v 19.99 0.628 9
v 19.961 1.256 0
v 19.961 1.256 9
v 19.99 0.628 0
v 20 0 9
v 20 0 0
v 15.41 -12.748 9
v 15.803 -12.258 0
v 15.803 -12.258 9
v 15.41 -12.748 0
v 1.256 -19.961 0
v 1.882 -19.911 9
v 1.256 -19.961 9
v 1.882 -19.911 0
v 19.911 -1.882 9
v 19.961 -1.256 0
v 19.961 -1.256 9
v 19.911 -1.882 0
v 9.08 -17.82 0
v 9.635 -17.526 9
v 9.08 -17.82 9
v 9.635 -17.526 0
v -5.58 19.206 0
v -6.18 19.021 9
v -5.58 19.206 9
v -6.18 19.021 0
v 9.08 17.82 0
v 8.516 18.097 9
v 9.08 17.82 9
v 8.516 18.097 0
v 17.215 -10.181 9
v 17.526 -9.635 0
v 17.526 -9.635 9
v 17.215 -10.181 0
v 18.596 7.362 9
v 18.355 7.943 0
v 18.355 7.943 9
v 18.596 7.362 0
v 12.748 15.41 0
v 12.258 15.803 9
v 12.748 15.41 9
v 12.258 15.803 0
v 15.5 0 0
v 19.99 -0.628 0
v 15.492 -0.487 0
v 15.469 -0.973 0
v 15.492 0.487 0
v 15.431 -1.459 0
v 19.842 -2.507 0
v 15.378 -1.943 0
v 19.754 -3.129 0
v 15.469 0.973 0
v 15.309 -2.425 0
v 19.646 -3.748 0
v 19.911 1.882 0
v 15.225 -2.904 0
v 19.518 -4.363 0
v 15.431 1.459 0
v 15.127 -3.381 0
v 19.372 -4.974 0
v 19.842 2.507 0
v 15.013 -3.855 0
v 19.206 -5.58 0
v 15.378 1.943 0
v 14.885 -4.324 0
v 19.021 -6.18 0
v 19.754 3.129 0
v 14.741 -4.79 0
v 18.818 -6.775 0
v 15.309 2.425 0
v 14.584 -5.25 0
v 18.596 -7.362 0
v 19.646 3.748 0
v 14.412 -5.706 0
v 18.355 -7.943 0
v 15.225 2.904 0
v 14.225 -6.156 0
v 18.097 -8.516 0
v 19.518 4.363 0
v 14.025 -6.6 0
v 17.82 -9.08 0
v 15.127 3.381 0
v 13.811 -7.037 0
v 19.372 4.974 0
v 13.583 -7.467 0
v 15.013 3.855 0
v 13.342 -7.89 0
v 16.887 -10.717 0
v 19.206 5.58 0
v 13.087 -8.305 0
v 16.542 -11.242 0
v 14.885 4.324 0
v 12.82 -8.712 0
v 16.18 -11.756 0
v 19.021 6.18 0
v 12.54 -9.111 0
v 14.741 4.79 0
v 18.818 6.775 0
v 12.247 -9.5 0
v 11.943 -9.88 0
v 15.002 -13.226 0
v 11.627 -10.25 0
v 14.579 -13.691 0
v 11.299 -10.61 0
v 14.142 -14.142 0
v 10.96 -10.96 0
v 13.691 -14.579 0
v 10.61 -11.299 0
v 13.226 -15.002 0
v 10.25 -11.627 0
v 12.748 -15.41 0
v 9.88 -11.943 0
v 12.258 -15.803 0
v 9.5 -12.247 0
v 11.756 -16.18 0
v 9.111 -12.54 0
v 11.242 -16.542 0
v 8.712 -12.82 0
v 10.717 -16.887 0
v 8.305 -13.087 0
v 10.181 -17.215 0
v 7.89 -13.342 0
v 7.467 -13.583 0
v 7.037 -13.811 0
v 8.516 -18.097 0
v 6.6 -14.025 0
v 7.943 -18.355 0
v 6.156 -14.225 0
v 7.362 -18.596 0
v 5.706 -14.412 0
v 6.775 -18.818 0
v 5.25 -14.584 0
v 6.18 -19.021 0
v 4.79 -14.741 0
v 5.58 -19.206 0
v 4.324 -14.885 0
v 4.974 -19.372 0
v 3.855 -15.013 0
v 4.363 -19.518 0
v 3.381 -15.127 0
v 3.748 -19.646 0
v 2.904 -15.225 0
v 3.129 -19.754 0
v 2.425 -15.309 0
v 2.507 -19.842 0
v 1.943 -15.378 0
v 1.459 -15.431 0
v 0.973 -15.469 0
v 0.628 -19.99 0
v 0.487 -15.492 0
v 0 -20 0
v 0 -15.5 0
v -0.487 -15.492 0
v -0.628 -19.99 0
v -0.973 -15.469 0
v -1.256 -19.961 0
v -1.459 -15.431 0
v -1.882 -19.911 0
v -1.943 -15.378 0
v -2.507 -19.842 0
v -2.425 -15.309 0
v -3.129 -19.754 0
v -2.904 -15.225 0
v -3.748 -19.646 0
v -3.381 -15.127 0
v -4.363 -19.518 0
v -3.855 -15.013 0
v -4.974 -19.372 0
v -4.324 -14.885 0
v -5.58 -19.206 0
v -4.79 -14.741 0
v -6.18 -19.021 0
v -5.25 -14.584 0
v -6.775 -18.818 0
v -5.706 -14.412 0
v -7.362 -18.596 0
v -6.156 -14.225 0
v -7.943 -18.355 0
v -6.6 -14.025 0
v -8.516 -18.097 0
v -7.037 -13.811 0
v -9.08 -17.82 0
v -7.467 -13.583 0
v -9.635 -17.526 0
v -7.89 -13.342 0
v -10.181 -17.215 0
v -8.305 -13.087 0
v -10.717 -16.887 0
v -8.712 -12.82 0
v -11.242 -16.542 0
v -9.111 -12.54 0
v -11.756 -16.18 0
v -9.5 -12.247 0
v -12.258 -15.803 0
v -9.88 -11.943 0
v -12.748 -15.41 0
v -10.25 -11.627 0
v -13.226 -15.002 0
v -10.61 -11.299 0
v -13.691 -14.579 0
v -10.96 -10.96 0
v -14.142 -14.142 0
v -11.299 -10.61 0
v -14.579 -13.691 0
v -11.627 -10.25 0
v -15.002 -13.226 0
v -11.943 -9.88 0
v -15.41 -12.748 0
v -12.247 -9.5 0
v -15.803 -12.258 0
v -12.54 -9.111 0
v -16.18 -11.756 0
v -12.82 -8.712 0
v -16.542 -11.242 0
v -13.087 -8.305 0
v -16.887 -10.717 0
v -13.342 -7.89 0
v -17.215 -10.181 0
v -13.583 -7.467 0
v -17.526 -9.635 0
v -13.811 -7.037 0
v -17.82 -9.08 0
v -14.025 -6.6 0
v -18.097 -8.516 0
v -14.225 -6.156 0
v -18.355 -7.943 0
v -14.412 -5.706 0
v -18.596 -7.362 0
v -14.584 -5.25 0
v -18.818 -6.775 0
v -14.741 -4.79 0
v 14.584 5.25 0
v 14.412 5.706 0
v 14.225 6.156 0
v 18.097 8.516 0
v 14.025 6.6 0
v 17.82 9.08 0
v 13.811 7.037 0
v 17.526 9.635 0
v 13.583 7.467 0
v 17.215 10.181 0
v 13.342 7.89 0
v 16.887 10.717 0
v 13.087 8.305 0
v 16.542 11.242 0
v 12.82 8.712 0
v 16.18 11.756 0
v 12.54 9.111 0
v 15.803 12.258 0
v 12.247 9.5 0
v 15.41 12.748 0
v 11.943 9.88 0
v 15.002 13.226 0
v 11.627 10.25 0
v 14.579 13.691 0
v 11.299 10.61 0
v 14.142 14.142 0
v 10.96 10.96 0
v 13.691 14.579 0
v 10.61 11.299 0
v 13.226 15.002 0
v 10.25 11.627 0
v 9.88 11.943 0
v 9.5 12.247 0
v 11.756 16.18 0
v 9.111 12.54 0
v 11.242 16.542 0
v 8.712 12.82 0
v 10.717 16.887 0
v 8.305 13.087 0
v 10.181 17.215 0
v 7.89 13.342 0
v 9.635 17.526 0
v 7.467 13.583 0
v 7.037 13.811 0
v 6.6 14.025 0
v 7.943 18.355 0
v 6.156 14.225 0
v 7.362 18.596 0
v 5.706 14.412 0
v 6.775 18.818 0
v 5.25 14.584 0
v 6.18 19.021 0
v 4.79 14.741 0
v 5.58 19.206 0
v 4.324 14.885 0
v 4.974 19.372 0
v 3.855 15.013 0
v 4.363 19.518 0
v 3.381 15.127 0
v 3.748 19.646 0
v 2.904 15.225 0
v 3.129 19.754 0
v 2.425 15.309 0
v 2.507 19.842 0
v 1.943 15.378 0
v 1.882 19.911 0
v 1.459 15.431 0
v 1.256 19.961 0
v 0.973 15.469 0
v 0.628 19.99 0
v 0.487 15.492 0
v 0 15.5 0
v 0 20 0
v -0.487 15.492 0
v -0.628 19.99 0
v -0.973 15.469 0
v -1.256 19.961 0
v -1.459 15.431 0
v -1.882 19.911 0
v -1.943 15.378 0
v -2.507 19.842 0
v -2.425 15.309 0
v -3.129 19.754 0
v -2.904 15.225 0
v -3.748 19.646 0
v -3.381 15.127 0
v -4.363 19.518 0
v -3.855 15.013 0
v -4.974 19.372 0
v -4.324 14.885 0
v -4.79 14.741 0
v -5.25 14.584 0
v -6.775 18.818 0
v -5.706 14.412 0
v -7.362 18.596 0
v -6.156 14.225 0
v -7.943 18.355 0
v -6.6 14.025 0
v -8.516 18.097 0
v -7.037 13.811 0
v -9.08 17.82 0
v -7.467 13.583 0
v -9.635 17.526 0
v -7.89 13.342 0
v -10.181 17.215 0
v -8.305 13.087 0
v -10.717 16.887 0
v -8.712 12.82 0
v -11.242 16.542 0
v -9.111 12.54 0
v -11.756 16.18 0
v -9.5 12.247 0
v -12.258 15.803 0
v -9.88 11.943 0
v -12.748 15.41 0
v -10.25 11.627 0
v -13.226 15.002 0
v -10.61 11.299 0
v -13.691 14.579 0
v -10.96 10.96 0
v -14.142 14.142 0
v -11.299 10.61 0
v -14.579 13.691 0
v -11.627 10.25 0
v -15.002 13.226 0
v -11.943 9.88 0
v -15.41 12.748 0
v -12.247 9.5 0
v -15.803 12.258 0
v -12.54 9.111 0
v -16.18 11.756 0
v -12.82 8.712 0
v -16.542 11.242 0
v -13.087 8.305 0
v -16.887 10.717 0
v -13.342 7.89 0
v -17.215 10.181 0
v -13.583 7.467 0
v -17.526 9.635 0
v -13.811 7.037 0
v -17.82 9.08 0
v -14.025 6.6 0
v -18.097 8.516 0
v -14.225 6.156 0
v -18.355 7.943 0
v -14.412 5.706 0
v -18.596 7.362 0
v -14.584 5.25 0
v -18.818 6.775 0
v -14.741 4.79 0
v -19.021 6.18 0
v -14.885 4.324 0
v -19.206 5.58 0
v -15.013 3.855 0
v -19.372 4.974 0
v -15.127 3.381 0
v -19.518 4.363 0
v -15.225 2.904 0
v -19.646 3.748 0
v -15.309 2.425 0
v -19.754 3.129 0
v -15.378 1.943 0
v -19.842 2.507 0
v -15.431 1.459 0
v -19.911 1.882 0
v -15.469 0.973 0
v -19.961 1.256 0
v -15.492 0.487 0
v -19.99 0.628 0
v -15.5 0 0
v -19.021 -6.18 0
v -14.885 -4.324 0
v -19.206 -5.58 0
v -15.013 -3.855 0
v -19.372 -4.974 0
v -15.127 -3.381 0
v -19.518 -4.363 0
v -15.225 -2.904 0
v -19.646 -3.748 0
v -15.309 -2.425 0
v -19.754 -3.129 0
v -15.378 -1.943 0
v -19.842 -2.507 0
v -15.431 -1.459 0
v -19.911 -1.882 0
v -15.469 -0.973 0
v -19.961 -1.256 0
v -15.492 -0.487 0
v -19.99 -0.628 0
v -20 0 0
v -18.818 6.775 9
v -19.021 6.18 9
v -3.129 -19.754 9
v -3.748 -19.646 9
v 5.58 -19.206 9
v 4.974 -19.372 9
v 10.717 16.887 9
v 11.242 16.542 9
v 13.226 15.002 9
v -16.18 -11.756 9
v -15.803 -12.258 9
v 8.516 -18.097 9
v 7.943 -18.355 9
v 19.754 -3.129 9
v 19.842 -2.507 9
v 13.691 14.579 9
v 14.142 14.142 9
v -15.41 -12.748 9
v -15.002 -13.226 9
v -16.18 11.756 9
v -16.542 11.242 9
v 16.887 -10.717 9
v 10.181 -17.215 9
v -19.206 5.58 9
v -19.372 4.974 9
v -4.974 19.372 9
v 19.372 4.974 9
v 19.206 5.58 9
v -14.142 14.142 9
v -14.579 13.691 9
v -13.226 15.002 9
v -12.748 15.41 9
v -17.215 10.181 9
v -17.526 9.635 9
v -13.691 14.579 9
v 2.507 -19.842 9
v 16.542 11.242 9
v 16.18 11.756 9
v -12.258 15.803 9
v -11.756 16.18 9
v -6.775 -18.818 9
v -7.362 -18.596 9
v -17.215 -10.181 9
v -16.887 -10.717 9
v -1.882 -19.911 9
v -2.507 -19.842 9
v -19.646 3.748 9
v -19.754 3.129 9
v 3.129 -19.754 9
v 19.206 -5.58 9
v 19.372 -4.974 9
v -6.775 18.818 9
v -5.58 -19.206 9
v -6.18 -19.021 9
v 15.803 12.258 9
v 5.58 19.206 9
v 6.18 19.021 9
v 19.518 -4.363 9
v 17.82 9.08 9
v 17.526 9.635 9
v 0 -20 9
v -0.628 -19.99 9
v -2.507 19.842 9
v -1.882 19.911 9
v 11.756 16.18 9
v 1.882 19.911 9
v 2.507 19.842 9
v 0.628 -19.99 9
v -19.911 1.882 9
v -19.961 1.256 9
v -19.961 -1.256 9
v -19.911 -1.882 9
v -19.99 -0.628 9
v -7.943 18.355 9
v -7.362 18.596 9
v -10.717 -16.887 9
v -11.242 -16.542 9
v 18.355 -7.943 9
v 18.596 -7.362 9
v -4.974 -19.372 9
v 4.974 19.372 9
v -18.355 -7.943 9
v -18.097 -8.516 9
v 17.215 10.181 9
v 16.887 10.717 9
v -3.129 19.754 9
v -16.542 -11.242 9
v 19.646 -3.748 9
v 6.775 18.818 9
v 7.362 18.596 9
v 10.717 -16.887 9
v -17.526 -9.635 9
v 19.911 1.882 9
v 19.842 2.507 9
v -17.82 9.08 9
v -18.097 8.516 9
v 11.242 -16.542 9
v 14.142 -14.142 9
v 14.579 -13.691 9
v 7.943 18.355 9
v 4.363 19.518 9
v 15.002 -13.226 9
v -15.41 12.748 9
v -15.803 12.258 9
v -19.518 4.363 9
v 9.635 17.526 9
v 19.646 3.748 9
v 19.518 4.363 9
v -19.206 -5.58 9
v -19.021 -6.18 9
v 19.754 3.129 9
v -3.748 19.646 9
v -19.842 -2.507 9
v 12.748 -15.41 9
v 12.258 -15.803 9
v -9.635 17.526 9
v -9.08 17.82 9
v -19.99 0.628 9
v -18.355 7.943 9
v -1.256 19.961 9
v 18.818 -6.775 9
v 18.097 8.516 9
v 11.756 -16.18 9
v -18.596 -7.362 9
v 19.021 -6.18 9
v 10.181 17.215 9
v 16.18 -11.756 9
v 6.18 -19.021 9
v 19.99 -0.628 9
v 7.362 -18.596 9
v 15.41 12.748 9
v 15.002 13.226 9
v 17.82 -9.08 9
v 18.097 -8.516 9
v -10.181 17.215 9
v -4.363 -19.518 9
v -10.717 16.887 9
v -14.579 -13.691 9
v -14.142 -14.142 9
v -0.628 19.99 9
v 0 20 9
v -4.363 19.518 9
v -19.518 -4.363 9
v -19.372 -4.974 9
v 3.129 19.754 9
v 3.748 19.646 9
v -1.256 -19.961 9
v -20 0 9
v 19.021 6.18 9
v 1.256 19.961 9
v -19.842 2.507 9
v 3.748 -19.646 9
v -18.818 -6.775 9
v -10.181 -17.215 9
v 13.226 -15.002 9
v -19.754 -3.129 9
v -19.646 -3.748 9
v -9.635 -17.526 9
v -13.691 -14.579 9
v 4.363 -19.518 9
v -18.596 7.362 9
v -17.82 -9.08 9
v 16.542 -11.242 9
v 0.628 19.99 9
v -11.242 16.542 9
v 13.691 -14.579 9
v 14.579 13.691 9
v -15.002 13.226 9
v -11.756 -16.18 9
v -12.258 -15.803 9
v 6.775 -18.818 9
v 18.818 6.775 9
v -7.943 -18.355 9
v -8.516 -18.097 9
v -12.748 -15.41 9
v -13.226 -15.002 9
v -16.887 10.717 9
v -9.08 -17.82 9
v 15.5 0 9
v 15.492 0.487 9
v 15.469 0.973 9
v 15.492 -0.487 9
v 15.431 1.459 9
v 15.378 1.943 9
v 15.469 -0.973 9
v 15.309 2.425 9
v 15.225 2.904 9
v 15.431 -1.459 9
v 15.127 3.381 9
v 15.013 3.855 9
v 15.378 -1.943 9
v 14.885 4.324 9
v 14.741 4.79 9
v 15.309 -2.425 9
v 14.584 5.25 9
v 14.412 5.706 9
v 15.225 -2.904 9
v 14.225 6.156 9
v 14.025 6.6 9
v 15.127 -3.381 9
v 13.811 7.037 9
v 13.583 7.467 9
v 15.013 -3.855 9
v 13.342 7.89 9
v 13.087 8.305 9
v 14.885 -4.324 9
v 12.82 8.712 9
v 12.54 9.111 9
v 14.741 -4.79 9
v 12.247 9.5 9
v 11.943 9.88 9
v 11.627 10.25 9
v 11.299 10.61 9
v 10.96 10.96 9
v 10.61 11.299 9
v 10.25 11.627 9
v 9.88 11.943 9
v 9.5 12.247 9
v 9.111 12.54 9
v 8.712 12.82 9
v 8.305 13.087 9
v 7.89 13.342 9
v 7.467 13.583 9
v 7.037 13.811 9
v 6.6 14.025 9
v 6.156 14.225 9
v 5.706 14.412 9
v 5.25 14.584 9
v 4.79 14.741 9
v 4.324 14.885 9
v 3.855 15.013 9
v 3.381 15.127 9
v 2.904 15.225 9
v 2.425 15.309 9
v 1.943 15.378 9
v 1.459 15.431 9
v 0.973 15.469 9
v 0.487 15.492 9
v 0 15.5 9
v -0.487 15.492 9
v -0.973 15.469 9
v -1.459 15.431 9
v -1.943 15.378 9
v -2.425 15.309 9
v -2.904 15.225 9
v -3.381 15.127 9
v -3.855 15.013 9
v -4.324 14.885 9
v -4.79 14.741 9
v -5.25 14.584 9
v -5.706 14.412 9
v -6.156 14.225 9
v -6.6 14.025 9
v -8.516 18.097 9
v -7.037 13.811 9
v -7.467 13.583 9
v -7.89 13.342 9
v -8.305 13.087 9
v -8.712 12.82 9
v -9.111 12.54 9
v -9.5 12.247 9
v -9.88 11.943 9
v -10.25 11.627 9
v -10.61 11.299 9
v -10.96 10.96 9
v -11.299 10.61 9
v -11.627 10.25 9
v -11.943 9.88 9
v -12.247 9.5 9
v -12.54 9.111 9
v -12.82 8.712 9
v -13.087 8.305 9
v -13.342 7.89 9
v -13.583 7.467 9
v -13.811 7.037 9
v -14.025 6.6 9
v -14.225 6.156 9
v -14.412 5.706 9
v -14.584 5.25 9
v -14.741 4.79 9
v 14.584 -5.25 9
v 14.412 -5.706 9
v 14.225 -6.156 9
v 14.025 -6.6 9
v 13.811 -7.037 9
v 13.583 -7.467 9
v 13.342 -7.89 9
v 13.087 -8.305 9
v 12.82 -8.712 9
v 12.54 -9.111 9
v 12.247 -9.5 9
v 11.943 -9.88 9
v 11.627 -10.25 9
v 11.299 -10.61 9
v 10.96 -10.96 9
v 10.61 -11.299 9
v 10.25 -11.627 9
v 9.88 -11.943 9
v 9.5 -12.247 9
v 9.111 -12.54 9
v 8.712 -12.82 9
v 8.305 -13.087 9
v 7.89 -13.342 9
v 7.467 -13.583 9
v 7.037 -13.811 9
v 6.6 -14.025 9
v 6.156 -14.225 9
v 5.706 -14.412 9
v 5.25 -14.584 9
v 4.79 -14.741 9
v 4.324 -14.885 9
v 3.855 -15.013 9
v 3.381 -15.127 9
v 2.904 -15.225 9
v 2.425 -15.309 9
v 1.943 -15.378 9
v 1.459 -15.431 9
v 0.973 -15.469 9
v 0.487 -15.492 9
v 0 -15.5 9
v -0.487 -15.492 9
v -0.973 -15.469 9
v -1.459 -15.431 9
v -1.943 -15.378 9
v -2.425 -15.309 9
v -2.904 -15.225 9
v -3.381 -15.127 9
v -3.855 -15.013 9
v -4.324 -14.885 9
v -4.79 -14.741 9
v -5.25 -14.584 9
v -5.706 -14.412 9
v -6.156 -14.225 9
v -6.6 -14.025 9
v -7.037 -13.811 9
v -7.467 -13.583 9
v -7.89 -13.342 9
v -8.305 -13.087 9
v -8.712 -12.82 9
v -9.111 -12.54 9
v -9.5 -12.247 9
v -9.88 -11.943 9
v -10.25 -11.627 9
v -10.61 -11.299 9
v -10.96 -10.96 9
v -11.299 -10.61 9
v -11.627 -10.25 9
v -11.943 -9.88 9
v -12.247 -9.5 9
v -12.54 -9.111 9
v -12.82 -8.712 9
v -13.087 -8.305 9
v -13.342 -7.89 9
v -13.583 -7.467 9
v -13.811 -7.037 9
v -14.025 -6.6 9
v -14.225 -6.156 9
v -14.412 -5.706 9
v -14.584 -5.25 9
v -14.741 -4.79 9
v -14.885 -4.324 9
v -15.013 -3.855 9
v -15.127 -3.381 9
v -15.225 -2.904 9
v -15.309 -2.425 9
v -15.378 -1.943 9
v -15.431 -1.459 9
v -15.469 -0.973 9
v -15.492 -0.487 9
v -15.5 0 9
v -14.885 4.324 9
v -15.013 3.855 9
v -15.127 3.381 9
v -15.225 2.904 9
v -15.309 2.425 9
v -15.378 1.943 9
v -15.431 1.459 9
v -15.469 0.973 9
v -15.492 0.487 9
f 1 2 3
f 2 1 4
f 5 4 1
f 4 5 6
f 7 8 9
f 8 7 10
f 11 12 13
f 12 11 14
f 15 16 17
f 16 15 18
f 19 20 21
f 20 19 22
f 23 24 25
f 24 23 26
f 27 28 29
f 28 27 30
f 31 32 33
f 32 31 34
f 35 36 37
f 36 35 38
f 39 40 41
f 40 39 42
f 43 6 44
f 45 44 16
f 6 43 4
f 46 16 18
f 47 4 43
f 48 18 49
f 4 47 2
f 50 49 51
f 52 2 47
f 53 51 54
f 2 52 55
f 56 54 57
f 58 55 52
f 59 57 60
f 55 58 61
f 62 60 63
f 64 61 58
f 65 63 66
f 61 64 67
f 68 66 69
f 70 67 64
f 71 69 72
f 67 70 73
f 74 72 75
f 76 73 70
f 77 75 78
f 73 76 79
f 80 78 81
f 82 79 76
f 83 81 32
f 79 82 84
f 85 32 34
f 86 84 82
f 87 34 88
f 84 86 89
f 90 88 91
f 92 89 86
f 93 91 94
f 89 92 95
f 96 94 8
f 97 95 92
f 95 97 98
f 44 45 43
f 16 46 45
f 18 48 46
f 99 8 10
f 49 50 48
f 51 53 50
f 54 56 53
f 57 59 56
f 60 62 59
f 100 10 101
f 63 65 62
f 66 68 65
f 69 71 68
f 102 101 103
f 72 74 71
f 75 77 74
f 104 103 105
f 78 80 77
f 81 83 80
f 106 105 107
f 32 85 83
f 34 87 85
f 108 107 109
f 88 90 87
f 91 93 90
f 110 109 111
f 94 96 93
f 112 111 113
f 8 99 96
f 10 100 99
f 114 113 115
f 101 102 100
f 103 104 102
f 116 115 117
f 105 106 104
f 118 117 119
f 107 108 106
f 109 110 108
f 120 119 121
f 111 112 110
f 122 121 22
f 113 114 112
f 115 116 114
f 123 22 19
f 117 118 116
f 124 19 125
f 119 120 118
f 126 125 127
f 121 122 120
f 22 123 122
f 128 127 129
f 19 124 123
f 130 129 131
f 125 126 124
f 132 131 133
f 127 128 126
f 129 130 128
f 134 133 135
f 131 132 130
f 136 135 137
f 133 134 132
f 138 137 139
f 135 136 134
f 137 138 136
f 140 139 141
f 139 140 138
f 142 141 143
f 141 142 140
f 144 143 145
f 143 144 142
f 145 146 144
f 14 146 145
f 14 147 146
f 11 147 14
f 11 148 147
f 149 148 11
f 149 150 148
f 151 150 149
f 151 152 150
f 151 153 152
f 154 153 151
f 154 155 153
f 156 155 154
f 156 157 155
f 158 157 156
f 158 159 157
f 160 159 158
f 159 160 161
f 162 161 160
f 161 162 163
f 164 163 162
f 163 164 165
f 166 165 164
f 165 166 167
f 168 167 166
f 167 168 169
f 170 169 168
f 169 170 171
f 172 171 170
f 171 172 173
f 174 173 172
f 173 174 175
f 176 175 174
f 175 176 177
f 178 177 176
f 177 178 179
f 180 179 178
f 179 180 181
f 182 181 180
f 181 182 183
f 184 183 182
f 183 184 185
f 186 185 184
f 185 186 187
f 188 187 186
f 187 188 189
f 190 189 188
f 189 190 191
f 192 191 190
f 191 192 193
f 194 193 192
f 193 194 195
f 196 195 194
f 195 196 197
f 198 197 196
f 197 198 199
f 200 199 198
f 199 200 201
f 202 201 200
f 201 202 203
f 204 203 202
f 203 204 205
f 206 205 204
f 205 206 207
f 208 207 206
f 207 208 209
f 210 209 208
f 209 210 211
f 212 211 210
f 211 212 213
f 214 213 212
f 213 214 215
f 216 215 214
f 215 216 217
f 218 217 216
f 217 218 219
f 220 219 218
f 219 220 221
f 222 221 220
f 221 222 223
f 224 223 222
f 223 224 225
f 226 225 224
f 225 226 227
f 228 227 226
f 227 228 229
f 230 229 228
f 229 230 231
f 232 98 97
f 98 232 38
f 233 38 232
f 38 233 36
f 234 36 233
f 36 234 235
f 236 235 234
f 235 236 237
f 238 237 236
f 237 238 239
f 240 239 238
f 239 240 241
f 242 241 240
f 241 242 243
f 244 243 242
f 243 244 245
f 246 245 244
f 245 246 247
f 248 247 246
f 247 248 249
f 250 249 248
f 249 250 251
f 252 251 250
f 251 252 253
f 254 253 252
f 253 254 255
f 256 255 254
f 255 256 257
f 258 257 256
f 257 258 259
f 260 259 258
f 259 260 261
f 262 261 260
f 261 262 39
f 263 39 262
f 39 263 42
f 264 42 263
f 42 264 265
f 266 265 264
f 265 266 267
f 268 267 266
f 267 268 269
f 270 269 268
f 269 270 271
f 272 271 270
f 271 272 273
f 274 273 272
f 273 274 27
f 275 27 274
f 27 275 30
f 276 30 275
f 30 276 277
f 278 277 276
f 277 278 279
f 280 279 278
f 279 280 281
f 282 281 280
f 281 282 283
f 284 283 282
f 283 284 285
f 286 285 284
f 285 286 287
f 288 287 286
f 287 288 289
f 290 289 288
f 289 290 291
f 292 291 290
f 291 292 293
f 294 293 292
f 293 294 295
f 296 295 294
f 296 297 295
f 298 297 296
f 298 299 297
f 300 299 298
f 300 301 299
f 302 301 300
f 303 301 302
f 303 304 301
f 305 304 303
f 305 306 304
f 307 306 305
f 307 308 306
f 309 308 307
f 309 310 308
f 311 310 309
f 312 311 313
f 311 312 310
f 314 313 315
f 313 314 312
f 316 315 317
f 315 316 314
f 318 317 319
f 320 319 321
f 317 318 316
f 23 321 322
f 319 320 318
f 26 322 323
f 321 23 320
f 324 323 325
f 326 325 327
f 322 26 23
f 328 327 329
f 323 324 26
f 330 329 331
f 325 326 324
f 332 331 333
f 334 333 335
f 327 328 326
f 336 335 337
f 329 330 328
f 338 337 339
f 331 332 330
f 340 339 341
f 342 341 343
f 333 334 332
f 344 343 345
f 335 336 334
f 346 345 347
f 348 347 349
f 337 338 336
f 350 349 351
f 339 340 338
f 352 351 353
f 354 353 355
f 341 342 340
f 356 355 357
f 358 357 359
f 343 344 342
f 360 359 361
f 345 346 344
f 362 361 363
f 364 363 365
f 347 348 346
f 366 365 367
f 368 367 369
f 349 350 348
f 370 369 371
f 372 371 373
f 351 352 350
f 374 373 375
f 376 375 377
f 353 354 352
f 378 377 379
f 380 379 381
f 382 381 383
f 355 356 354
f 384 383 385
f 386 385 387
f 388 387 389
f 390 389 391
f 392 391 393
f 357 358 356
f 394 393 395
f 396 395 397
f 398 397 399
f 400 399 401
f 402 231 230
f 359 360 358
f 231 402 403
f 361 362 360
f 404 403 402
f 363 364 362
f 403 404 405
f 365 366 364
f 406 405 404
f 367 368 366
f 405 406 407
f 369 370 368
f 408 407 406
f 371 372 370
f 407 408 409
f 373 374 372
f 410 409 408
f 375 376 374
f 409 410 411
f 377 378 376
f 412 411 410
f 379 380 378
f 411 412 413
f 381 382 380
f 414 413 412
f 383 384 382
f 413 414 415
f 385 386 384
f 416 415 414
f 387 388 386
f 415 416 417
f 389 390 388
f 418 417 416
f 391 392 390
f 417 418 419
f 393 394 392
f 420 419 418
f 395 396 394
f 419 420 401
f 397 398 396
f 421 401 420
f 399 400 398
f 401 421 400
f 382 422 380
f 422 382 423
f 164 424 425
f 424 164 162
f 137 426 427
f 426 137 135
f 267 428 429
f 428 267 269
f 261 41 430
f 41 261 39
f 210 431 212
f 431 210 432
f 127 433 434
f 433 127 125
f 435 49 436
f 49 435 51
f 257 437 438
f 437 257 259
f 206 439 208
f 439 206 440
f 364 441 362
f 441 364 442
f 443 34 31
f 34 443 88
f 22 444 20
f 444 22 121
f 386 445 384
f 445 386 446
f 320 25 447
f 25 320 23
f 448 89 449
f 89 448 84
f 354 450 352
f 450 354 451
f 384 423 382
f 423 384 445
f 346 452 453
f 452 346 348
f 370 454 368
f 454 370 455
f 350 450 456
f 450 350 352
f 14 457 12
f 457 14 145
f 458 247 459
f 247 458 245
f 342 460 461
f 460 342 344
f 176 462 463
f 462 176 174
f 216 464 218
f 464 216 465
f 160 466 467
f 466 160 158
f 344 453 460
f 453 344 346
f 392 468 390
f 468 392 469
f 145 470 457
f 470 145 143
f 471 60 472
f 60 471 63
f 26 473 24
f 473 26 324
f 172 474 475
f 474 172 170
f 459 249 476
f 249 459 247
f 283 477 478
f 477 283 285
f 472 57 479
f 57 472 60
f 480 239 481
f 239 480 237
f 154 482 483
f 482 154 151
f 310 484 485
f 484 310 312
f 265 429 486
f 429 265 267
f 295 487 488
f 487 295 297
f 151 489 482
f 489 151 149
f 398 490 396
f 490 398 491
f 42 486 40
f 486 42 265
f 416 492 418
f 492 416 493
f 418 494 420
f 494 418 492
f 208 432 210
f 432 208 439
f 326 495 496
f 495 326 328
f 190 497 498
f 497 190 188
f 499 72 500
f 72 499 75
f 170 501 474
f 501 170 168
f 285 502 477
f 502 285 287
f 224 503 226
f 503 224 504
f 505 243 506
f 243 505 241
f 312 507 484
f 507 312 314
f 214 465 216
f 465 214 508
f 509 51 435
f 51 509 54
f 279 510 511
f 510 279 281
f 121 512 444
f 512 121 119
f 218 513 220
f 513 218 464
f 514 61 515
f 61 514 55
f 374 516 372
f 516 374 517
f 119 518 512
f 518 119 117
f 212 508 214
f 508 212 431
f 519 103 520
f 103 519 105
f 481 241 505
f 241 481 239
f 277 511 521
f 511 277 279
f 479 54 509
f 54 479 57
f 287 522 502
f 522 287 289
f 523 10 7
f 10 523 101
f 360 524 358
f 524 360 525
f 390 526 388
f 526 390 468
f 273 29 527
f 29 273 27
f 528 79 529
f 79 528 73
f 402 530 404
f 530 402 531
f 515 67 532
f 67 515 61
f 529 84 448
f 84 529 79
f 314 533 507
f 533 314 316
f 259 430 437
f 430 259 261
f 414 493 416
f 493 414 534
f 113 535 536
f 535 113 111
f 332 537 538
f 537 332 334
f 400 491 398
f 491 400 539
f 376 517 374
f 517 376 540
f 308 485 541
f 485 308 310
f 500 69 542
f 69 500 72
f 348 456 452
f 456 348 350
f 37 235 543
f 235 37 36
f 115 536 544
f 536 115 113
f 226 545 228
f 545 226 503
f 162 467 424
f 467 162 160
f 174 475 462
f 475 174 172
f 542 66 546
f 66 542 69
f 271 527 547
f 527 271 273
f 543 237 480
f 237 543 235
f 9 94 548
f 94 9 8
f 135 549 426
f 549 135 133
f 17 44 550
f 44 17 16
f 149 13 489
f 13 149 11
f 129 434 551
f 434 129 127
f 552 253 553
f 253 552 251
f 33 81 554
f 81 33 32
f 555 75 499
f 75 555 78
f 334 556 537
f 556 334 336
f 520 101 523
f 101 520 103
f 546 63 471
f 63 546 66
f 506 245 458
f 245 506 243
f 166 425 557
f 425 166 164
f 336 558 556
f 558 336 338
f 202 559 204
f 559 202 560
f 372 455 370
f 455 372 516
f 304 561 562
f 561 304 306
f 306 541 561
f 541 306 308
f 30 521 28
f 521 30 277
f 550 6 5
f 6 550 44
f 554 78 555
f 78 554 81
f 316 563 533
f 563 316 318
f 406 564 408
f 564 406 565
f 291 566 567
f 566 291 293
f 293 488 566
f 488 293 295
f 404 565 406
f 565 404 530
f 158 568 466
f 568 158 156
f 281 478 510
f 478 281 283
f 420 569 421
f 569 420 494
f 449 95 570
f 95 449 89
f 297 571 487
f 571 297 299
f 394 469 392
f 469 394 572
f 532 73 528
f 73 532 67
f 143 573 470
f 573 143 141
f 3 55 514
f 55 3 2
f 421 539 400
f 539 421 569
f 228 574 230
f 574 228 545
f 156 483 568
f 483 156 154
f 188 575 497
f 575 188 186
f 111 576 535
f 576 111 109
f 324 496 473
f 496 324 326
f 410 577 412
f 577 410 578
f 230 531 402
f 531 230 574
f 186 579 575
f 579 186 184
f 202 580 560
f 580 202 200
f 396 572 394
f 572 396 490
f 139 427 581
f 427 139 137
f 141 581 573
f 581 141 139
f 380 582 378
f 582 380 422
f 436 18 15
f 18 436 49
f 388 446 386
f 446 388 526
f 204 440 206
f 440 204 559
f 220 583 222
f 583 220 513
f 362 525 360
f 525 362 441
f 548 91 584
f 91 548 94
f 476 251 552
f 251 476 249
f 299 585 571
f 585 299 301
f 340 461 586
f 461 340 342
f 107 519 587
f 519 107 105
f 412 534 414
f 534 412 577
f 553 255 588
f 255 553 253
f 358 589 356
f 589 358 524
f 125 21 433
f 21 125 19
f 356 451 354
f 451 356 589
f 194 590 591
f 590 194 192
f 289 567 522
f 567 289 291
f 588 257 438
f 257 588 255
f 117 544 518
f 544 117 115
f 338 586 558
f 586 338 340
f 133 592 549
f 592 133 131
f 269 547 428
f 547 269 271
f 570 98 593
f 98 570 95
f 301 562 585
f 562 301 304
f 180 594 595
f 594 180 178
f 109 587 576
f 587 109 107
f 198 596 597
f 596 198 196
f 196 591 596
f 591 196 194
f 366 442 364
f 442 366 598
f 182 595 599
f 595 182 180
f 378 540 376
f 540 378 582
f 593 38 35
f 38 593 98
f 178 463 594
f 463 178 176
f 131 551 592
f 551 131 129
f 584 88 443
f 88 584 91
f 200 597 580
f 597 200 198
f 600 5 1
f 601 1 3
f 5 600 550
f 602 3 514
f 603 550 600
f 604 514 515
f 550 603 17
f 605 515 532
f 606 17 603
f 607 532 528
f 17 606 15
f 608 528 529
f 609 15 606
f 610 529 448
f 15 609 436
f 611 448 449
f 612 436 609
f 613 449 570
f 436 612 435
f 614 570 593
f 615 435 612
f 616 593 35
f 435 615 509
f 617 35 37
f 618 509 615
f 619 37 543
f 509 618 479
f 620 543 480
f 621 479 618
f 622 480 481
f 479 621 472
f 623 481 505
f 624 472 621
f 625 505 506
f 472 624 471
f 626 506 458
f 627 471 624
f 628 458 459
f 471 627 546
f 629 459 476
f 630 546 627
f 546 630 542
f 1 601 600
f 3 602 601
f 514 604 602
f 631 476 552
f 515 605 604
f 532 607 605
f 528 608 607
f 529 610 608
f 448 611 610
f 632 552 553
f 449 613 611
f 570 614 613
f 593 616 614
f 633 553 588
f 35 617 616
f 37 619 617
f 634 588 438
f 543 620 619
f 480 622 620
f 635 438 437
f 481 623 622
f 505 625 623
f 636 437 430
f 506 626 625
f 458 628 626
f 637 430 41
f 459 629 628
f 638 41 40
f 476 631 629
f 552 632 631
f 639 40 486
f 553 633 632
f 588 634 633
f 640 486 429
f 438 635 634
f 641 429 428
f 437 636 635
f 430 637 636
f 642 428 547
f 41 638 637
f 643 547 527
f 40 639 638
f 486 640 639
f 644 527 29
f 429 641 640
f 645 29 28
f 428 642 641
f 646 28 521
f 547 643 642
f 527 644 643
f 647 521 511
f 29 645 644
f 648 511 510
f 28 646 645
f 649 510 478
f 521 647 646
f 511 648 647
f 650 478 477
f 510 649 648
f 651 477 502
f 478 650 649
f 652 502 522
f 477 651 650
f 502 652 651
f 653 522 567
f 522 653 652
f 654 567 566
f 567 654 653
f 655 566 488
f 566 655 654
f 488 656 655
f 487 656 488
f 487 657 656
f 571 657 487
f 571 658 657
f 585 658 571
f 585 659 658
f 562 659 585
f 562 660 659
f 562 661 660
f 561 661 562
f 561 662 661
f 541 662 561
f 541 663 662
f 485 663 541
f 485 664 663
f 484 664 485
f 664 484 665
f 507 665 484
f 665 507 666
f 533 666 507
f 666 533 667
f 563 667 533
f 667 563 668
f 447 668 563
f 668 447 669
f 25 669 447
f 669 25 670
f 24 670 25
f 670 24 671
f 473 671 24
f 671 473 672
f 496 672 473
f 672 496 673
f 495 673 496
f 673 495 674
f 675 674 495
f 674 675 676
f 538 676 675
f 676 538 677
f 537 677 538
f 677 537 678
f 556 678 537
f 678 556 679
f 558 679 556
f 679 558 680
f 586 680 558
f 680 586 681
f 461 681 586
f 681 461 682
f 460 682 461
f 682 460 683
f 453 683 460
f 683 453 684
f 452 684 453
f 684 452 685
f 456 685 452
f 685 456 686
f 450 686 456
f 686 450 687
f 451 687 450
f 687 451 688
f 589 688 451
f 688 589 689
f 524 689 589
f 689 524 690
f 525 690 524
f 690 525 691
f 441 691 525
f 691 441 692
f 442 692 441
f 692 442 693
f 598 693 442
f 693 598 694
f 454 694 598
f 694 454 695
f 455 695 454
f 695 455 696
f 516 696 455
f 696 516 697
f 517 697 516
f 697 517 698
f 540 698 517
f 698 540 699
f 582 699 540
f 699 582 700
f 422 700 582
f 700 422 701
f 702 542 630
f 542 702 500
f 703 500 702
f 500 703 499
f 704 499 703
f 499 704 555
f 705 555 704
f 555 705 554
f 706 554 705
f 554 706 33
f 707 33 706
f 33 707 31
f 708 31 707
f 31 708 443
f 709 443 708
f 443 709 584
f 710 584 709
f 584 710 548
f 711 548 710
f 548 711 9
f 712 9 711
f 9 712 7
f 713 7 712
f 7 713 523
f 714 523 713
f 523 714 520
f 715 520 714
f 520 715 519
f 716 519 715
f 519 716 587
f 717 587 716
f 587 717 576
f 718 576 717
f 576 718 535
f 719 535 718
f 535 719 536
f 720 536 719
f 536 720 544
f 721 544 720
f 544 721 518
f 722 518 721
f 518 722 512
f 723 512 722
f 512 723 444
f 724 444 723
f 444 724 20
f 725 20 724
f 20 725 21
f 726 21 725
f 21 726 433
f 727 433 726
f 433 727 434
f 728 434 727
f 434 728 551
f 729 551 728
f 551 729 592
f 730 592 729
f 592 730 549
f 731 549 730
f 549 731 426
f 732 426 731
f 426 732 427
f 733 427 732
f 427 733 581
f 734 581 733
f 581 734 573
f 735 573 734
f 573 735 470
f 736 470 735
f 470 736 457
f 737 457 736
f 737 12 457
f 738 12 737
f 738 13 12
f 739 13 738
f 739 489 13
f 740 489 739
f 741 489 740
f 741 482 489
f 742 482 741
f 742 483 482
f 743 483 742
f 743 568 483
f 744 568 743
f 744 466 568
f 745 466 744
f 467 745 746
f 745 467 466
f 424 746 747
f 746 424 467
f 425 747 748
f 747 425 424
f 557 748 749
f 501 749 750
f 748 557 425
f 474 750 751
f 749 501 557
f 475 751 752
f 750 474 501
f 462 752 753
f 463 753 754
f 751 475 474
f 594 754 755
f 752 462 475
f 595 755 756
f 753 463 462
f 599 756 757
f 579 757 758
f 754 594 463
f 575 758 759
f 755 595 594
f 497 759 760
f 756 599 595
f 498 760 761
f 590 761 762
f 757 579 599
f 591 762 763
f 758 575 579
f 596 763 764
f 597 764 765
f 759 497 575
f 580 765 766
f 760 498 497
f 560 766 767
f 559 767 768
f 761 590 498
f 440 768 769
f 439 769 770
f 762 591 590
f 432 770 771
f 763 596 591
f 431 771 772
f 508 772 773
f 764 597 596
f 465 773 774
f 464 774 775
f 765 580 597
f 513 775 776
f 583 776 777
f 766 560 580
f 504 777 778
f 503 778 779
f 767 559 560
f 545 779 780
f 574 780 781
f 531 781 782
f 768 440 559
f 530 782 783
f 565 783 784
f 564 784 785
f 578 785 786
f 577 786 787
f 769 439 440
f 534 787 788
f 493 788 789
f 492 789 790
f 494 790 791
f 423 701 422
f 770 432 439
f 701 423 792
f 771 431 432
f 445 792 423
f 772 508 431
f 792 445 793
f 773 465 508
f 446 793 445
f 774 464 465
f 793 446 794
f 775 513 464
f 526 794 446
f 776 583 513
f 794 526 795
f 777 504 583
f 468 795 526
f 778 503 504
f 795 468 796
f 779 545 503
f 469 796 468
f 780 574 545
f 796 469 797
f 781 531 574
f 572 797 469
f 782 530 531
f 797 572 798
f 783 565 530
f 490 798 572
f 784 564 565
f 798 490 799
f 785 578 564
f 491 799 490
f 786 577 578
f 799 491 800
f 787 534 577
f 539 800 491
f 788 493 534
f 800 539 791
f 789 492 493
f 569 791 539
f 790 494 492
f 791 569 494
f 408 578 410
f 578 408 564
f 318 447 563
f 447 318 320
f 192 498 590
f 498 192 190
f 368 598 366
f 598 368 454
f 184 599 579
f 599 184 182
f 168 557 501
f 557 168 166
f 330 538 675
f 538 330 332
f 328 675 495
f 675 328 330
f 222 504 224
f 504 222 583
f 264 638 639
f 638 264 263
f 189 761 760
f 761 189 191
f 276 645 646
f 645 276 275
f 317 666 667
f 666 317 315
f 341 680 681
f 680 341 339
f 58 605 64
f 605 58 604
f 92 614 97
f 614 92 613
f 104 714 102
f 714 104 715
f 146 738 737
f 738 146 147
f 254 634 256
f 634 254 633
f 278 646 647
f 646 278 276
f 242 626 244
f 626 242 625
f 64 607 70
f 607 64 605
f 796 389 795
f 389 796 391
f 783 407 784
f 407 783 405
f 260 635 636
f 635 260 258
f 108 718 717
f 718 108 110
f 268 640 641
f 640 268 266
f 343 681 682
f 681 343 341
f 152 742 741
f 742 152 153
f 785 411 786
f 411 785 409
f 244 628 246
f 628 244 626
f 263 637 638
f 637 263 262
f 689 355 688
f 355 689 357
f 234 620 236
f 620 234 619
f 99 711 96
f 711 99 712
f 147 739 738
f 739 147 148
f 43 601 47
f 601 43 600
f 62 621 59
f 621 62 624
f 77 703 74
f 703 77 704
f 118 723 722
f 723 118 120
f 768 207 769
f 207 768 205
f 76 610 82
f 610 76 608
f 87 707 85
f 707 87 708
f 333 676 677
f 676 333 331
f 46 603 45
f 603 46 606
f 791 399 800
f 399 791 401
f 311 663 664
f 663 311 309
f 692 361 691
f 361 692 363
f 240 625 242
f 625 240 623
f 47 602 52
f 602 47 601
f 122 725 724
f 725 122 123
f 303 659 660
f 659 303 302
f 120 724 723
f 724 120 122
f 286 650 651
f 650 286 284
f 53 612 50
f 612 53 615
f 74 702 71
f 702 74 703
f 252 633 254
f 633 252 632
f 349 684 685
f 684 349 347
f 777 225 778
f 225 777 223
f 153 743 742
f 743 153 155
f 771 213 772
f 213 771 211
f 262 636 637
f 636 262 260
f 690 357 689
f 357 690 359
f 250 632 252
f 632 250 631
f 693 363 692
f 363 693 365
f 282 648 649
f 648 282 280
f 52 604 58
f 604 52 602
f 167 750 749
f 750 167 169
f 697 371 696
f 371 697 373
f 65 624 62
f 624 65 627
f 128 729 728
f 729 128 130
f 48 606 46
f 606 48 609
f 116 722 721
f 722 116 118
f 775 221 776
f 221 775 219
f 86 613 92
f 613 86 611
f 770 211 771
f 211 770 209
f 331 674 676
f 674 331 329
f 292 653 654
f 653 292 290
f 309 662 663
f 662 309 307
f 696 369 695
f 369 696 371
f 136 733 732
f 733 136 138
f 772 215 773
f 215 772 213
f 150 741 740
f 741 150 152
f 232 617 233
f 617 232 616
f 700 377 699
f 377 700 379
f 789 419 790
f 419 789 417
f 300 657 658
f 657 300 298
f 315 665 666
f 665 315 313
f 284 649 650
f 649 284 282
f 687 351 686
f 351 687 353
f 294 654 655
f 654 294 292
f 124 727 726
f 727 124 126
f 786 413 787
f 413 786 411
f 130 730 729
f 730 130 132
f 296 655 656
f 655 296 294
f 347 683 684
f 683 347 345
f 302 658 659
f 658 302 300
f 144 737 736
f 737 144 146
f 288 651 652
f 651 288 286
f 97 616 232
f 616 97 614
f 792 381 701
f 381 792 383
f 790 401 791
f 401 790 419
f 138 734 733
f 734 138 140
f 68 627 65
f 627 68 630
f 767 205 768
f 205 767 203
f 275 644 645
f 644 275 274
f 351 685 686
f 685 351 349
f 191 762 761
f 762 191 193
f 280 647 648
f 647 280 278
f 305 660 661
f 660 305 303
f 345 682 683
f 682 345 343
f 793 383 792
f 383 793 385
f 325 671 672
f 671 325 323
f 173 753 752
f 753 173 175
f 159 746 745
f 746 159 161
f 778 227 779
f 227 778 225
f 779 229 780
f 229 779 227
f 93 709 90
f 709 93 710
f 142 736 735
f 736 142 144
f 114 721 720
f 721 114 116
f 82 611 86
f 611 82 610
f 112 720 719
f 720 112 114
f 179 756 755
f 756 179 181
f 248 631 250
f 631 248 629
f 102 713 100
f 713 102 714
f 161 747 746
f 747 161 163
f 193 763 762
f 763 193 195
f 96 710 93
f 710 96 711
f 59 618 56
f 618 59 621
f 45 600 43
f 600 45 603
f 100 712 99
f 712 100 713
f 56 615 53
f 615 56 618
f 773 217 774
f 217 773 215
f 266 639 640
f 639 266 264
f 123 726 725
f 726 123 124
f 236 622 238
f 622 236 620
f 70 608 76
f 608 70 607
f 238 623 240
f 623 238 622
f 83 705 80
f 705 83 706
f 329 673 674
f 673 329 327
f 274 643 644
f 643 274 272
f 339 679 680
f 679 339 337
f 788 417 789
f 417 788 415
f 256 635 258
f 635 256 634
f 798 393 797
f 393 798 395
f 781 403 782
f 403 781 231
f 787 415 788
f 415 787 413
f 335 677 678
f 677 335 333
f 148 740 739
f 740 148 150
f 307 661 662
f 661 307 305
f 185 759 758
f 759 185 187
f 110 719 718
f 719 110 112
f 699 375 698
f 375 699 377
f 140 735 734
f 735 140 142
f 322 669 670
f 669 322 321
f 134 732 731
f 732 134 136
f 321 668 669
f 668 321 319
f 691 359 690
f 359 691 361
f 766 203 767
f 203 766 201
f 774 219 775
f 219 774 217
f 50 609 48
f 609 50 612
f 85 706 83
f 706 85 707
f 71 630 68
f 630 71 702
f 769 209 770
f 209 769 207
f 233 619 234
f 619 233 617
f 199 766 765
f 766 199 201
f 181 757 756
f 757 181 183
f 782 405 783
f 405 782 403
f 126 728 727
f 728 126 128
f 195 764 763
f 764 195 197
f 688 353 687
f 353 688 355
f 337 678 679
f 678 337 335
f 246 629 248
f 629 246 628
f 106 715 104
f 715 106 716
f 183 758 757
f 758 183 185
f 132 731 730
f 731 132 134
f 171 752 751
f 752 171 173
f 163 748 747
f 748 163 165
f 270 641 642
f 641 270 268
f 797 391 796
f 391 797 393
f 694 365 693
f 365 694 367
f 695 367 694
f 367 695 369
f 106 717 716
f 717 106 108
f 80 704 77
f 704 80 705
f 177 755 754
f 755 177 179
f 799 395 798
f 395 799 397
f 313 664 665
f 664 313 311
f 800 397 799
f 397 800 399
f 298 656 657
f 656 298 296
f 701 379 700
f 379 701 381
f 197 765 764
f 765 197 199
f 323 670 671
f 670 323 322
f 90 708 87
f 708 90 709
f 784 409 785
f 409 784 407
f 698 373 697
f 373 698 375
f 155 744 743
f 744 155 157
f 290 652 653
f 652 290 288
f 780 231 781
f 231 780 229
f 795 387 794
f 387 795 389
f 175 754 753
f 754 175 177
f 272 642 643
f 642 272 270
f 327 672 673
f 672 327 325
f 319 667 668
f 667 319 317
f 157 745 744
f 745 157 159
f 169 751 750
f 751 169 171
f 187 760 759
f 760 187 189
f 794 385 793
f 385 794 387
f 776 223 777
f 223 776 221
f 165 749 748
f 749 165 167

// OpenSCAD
innerRadius = 31/2;
outerRadius = 40/2;

difference() {
    cylinder(9, outerRadius,outerRadius, $fn=200);
    
    cylinder(9, innerRadius,innerRadius, $fn=200);
}
